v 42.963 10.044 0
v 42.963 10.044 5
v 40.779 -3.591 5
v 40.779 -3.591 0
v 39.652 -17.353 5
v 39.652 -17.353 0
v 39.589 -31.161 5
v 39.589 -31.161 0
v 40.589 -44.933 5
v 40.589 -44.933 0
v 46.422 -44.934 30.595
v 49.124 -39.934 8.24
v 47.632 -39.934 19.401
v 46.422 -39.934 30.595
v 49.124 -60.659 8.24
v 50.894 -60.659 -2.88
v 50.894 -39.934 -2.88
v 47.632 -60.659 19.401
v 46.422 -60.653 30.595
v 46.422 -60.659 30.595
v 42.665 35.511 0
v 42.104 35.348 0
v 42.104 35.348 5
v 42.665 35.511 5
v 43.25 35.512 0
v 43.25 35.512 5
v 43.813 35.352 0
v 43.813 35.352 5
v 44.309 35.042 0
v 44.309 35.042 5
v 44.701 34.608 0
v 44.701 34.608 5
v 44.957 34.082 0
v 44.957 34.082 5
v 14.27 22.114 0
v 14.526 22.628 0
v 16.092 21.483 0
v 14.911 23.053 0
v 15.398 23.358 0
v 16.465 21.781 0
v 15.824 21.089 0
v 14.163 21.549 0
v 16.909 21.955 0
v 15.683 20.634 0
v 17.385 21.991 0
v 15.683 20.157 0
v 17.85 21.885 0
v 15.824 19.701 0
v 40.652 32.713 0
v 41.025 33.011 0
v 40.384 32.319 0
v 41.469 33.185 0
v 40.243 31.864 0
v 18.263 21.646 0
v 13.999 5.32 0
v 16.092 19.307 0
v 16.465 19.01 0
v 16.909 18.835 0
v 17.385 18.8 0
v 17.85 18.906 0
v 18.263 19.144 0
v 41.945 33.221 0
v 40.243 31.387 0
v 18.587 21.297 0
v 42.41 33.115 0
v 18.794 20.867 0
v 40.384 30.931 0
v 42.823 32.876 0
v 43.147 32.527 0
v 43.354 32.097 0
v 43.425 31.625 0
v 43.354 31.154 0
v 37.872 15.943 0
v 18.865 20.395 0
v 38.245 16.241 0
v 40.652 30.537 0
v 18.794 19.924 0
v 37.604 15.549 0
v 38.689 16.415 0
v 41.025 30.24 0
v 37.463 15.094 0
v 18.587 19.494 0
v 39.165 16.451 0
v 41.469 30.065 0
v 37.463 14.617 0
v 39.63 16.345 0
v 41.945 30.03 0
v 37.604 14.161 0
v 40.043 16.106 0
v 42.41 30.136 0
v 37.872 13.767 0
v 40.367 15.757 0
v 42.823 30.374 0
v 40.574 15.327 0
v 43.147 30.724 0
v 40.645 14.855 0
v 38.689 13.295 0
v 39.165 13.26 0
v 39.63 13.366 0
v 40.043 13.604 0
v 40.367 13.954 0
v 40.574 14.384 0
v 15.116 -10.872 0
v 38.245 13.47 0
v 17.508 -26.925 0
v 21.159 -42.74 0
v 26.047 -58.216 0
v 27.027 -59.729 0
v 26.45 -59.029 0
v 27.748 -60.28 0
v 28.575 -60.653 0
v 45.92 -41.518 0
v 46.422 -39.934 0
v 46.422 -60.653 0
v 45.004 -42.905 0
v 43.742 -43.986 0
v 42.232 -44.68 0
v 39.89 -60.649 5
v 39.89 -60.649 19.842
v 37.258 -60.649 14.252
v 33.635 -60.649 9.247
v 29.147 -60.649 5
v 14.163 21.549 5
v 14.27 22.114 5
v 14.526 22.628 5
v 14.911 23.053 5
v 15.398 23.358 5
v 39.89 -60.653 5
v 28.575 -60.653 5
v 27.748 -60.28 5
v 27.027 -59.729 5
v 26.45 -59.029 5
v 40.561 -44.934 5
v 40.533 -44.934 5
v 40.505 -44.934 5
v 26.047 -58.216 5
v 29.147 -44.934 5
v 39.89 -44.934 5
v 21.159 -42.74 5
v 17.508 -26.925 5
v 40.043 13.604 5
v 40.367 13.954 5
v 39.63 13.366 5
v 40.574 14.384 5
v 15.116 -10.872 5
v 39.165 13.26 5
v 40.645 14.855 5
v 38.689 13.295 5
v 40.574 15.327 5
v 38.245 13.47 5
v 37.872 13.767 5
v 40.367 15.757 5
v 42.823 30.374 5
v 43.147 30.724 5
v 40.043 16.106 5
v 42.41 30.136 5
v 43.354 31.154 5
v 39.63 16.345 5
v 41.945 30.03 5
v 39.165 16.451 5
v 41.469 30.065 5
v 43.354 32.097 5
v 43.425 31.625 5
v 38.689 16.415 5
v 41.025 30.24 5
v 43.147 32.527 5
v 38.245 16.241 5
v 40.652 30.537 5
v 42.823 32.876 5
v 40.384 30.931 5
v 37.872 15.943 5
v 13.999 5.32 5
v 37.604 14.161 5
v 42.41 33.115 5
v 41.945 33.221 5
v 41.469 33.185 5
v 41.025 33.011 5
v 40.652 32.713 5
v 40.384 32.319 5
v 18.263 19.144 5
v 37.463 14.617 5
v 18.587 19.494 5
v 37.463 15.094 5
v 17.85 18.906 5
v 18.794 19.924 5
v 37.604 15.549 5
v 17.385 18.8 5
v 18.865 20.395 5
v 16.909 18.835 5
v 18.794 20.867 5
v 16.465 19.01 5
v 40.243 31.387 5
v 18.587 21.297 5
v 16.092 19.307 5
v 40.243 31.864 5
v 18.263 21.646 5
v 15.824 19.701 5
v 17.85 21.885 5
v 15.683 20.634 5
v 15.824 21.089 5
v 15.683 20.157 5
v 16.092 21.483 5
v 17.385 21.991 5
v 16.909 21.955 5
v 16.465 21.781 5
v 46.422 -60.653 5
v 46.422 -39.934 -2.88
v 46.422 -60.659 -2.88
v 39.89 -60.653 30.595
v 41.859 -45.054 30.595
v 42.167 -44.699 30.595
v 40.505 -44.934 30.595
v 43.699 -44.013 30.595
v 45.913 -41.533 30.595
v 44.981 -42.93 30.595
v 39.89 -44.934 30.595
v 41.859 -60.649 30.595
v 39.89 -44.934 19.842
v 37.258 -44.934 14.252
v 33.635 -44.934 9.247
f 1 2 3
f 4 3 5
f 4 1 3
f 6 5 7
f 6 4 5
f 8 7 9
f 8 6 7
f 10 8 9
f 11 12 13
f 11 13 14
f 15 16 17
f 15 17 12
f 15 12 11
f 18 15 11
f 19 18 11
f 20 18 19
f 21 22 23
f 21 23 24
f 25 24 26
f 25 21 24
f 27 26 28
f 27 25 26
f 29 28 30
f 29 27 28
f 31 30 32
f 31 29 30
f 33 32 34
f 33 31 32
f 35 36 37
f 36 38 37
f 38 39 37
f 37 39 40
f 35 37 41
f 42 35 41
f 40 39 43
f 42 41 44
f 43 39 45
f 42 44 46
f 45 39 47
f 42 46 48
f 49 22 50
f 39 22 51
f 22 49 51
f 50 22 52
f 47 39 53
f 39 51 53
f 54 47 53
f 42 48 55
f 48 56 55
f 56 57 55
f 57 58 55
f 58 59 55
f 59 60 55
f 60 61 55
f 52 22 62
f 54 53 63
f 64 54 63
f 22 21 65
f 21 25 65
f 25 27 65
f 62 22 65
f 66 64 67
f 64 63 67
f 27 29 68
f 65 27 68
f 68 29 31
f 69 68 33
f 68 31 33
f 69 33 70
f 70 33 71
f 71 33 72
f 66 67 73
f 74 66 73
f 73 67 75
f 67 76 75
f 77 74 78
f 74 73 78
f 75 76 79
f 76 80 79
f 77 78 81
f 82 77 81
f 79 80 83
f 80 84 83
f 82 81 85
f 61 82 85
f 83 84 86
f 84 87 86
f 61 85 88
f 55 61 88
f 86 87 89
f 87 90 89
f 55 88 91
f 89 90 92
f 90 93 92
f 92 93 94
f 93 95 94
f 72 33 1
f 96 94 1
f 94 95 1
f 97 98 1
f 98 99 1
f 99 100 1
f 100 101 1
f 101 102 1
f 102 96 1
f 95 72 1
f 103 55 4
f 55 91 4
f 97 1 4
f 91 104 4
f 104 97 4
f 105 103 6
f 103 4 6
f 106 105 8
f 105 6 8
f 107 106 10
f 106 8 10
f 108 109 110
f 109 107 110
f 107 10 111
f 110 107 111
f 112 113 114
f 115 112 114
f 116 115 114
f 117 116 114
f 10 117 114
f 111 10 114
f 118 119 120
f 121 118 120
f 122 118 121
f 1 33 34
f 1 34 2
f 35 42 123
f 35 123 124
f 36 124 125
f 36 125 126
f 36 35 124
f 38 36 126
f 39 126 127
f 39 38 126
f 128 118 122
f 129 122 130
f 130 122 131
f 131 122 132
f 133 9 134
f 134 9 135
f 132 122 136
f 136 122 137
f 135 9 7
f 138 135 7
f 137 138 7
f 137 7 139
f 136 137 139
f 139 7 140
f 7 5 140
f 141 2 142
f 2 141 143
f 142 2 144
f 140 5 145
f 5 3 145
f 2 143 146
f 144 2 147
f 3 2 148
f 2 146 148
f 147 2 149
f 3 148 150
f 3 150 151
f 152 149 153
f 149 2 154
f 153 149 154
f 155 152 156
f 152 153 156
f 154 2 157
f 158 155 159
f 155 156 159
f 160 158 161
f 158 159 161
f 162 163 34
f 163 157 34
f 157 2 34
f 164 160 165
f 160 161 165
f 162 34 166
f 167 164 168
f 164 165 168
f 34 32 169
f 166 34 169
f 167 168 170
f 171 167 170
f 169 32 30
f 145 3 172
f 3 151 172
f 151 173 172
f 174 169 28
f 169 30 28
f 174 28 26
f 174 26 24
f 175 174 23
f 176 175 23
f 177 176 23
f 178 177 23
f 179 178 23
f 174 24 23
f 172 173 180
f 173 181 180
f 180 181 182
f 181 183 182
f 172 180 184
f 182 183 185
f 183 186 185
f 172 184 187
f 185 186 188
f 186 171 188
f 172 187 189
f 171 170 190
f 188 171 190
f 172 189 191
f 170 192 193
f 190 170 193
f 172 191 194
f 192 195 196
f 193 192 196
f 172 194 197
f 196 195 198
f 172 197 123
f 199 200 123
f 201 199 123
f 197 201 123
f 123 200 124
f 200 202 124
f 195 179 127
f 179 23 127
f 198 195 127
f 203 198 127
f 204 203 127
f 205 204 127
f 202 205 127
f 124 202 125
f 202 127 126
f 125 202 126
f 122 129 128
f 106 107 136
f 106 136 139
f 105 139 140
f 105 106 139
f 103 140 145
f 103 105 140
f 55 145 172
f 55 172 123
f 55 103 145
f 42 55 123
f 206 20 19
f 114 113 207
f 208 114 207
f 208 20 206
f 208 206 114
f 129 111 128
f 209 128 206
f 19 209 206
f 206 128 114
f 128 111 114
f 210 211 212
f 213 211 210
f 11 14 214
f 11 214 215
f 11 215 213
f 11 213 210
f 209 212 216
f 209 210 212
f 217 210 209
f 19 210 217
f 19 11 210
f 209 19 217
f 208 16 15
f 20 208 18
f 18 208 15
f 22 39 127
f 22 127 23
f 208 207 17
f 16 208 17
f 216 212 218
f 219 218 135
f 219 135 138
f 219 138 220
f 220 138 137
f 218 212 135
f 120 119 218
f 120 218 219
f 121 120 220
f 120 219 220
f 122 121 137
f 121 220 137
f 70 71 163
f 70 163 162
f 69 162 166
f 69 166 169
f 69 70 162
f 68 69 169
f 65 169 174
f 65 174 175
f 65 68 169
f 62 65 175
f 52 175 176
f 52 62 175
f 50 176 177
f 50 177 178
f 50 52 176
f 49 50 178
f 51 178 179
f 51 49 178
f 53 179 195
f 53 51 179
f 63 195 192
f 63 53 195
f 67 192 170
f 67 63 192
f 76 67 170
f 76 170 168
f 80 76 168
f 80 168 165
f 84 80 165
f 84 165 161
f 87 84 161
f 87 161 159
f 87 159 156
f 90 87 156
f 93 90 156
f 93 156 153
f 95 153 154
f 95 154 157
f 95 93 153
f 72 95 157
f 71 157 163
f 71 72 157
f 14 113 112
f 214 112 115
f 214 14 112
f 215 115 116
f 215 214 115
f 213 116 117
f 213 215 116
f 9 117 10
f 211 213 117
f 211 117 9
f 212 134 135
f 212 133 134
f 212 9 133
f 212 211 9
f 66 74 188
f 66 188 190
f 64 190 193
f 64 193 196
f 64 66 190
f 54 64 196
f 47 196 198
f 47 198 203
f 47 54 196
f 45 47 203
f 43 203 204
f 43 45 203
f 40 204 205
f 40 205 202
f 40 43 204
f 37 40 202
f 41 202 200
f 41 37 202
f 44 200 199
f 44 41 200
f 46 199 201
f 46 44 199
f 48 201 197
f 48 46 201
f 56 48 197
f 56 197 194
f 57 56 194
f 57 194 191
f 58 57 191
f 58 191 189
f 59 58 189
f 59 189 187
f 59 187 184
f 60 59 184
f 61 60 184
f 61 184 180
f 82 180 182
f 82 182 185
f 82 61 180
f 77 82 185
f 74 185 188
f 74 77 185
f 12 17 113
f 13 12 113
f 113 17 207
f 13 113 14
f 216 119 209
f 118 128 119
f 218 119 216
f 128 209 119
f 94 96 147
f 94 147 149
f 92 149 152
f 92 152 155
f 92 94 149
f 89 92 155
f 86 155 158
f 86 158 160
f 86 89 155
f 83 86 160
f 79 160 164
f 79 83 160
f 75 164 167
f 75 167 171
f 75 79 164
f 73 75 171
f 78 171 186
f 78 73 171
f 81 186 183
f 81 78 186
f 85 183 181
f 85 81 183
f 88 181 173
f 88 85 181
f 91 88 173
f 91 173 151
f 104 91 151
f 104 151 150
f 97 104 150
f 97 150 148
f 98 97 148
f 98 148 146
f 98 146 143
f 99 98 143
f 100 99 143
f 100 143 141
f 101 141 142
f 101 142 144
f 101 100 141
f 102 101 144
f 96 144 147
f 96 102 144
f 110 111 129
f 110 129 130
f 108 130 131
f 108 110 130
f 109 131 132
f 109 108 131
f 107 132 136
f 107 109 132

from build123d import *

# Parameters (mm, degrees)
SKETCH3_R                = 1.6
BOSS_EXTRUDE2_DEPTH      = 5
SKETCH8_W                = 6.531662429
SKETCH8_H                = 15.718756423
BOSS_EXTRUDE5_DEPTH      = 25.594989388
BOSS_EXTRUDE6_DEPTH      = 5
BOSS_EXTRUDE6_DEPTH_BACK = 15.725319597
BOSS_EXTRUDE7_DEPTH      = 15.715206985
FILLET3_R                = 6


with BuildPart() as part:
    # Sketch3 → Boss-Extrude2 (new body)
    with BuildSketch(Plane.XY):
        with BuildLine():
            Line((15.398328751, 23.358235096), (42.103650237, 35.3480109))
            ThreePointArc((42.103650237, 35.3480109), (43.812929052, 35.351800988), (44.957199874, 34.082040099))
            Line((44.957199874, 34.082040099), (42.962535727, 10.043789437))
            ThreePointArc((42.962535727, 10.043789437), (39.652134692, -17.353336053), (40.589325164, -44.933816726))
            Line((40.589325164, -44.933816726), (46.4215305, -44.933816726))
            Line((46.4215305, -44.933816726), (46.4215305, -60.652573149))
            Line((46.4215305, -60.652573149), (28.574574678, -60.652573149))
            ThreePointArc((28.574574678, -60.652573149), (27.026794649, -59.729266605), (26.047291344, -58.216424488))
            ThreePointArc((26.047291344, -58.216424488), (16.153529465, -18.922365583), (14.162802755, 21.549187347))
            ThreePointArc((14.162802755, 21.549187347), (14.525551977, 22.627878073), (15.398328751, 23.358235096))
        make_face()
        with Locations((17.26515434, 20.395199458)):
            Circle(SKETCH3_R, mode=Mode.SUBTRACT)
        with Locations((41.82515434, 31.625199458)):
            Circle(SKETCH3_R, mode=Mode.SUBTRACT)
        with Locations((39.04515434, 14.855199458)):
            Circle(SKETCH3_R, mode=Mode.SUBTRACT)
    extrude(amount=BOSS_EXTRUDE2_DEPTH)

    # Sketch8 → Boss-Extrude5 (add)
    with BuildSketch(Plane.XY.offset(5)):
        with Locations((43.155699286, -52.793194938)):
            Rectangle(SKETCH8_W, SKETCH8_H)
    extrude(amount=BOSS_EXTRUDE5_DEPTH)

    # Sketch9 → Boss-Extrude6 (add, two sides: drawn at the far end of the back side and taken through both)
    with BuildSketch(Plane(origin=(0, -44.933816726, 0), x_dir=(1, 0, 0), z_dir=(0, 1, 0)).offset(-BOSS_EXTRUDE6_DEPTH_BACK)):
        with BuildLine():
            Line((46.4215305, -30.594989388), (46.4215305, 0))
            Line((46.4215305, 0), (46.4215305, 2.879605598))
            Line((46.4215305, 2.879605598), (50.894134372, 2.879605598))
            ThreePointArc((50.894134372, 2.879605598), (48.34293367, -13.815617676), (46.4215305, -30.594989388))
        make_face()
    extrude(amount=BOSS_EXTRUDE6_DEPTH + BOSS_EXTRUDE6_DEPTH_BACK)

    # Sketch10 → Boss-Extrude7 (add)
    with BuildSketch(Plane(origin=(0, -44.933816726, 0), x_dir=(1, 0, 0), z_dir=(0, 1, 0))):
        with BuildLine():
            Line((29.146955031, -5), (41.859352304, -5))
            Line((41.859352304, -5), (41.859352304, -30.594989388))
            ThreePointArc((41.859352304, -30.594989388), (38.401030969, -16.358190815), (29.146955031, -5))
        make_face()
    extrude(amount=-BOSS_EXTRUDE7_DEPTH)

    # Fillet3
    # the kernel refuses this fillet: 6 mm, written as the material it adds along each edge
    with BuildSketch(Plane(origin=(46.4215305, -44.933816726, 30.594989388), x_dir=(0, 1, 0), z_dir=(0, 0, -1))) as fillet3_piece_1_section:
        with BuildLine():
            CenterArc((6, -5.916079783), FILLET3_R, 99.594068227, 80.405931773)
            Line((0, -5.916079783), (-0.12, -5.916079783))
            Line((-0.12, -5.916079783), (-0.12, 0))
            Line((-0.12, 0), (0, 0.12))
            ThreePointArc((0, 0.12), (2.5, 0.12), (4.98, 0.118321596))
            Line((4.98, 0.118321596), (5, 0))
        make_face()
    fillet3_piece_1 = extrude(amount=30.594989388, mode=Mode.PRIVATE)
    fillet3_piece_1 = fillet3_piece_1 - Plane(origin=(493.305440786, -43.701646152, 73.26789881), x_dir=(-0.9855086772136745, 0, -0.16962501919396705), z_dir=(0, -1, 0)) * Cylinder(448.916703265, 85, mode=Mode.PRIVATE)
    add(fillet3_piece_1)


solid = part.part
